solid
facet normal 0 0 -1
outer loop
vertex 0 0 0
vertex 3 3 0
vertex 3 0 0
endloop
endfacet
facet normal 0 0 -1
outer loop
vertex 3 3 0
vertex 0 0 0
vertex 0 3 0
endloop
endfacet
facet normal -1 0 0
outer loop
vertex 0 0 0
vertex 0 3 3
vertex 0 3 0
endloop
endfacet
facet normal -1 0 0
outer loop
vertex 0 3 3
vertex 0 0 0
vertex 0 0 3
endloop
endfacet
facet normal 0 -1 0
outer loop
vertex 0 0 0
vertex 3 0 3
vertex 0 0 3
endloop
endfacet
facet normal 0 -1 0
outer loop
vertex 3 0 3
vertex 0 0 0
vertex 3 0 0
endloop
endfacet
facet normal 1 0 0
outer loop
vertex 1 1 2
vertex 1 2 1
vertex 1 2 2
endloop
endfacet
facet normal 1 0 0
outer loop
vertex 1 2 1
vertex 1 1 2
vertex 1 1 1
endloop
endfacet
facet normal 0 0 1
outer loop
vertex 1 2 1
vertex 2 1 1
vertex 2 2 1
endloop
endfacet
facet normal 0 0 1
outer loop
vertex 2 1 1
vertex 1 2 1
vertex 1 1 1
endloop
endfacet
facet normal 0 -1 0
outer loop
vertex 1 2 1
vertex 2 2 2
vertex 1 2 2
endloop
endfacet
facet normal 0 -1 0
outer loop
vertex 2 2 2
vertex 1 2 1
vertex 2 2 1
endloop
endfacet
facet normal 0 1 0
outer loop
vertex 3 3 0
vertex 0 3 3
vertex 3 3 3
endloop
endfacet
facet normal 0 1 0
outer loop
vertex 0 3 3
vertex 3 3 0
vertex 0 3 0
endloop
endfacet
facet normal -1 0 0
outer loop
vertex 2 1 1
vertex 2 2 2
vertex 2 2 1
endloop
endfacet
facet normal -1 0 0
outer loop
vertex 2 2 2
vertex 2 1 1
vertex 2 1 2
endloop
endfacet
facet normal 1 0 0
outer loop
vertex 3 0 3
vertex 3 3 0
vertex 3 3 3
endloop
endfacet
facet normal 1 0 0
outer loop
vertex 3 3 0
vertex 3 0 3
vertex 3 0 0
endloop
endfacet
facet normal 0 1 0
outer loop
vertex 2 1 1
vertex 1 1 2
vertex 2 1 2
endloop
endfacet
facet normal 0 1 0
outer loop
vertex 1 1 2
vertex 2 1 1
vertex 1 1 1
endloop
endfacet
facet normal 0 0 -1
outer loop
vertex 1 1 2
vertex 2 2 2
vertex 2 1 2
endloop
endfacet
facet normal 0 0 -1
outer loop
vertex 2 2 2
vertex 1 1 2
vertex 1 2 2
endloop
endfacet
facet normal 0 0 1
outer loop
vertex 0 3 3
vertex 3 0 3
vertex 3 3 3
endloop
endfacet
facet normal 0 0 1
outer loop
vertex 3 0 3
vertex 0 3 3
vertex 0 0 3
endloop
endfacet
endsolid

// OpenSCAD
translate([0, 0, 0]) cube(1);
translate([0, 0, 0]) cube(1);
translate([0, 0, 0]) cube(1);
translate([0, 1, 0]) cube(1);
translate([0, 1, 0]) cube(1);
translate([0, 1, 0]) cube(1);
translate([0, 2, 0]) cube(1);
translate([0, 2, 0]) cube(1);
translate([0, 2, 0]) cube(1);
translate([1, 0, 0]) cube(1);
translate([1, 0, 0]) cube(1);
translate([1, 0, 0]) cube(1);
translate([1, 1, 0]) cube(1);
translate([1, 1, 0]) cube(1);
translate([1, 1, 0]) cube(1);
translate([1, 2, 0]) cube(1);
translate([1, 2, 0]) cube(1);
translate([1, 2, 0]) cube(1);
translate([2, 0, 0]) cube(1);
translate([2, 0, 0]) cube(1);
translate([2, 0, 0]) cube(1);
translate([2, 1, 0]) cube(1);
translate([2, 1, 0]) cube(1);
translate([2, 1, 0]) cube(1);
translate([2, 2, 0]) cube(1);
translate([2, 2, 0]) cube(1);
translate([2, 2, 0]) cube(1);
translate([0, 0, 1]) cube(1);
translate([0, 0, 1]) cube(1);
translate([0, 0, 1]) cube(1);
translate([0, 1, 1]) cube(1);
translate([0, 1, 1]) cube(1);
translate([0, 1, 1]) cube(1);
translate([0, 2, 1]) cube(1);
translate([0, 2, 1]) cube(1);
translate([0, 2, 1]) cube(1);
translate([1, 2, 1]) cube(1);
translate([1, 2, 1]) cube(1);
translate([1, 2, 1]) cube(1);
translate([2, 0, 1]) cube(1);
translate([2, 0, 1]) cube(1);
translate([2, 0, 1]) cube(1);
translate([2, 2, 1]) cube(1);
translate([2, 2, 1]) cube(1);
translate([2, 2, 1]) cube(1);
translate([2, 1, 1]) cube(1);
translate([2, 1, 1]) cube(1);
translate([2, 1, 1]) cube(1);
translate([1, 0, 1]) cube(1);
translate([1, 0, 1]) cube(1);
translate([1, 0, 1]) cube(1);
translate([0, 0, 2]) cube(1);
translate([0, 0, 2]) cube(1);
translate([0, 0, 2]) cube(1);
translate([0, 1, 2]) cube(1);
translate([0, 1, 2]) cube(1);
translate([0, 1, 2]) cube(1);
translate([0, 2, 2]) cube(1);
translate([0, 2, 2]) cube(1);
translate([0, 2, 2]) cube(1);
translate([1, 0, 2]) cube(1);
translate([1, 0, 2]) cube(1);
translate([1, 0, 2]) cube(1);
translate([1, 1, 2]) cube(1);
translate([1, 1, 2]) cube(1);
translate([1, 1, 2]) cube(1);
translate([1, 2, 2]) cube(1);
translate([1, 2, 2]) cube(1);
translate([1, 2, 2]) cube(1);
translate([2, 0, 2]) cube(1);
translate([2, 0, 2]) cube(1);
translate([2, 0, 2]) cube(1);
translate([2, 1, 2]) cube(1);
translate([2, 1, 2]) cube(1);
translate([2, 1, 2]) cube(1);
translate([2, 2, 2]) cube(1);
translate([2, 2, 2]) cube(1);
translate([2, 2, 2]) cube(1);
